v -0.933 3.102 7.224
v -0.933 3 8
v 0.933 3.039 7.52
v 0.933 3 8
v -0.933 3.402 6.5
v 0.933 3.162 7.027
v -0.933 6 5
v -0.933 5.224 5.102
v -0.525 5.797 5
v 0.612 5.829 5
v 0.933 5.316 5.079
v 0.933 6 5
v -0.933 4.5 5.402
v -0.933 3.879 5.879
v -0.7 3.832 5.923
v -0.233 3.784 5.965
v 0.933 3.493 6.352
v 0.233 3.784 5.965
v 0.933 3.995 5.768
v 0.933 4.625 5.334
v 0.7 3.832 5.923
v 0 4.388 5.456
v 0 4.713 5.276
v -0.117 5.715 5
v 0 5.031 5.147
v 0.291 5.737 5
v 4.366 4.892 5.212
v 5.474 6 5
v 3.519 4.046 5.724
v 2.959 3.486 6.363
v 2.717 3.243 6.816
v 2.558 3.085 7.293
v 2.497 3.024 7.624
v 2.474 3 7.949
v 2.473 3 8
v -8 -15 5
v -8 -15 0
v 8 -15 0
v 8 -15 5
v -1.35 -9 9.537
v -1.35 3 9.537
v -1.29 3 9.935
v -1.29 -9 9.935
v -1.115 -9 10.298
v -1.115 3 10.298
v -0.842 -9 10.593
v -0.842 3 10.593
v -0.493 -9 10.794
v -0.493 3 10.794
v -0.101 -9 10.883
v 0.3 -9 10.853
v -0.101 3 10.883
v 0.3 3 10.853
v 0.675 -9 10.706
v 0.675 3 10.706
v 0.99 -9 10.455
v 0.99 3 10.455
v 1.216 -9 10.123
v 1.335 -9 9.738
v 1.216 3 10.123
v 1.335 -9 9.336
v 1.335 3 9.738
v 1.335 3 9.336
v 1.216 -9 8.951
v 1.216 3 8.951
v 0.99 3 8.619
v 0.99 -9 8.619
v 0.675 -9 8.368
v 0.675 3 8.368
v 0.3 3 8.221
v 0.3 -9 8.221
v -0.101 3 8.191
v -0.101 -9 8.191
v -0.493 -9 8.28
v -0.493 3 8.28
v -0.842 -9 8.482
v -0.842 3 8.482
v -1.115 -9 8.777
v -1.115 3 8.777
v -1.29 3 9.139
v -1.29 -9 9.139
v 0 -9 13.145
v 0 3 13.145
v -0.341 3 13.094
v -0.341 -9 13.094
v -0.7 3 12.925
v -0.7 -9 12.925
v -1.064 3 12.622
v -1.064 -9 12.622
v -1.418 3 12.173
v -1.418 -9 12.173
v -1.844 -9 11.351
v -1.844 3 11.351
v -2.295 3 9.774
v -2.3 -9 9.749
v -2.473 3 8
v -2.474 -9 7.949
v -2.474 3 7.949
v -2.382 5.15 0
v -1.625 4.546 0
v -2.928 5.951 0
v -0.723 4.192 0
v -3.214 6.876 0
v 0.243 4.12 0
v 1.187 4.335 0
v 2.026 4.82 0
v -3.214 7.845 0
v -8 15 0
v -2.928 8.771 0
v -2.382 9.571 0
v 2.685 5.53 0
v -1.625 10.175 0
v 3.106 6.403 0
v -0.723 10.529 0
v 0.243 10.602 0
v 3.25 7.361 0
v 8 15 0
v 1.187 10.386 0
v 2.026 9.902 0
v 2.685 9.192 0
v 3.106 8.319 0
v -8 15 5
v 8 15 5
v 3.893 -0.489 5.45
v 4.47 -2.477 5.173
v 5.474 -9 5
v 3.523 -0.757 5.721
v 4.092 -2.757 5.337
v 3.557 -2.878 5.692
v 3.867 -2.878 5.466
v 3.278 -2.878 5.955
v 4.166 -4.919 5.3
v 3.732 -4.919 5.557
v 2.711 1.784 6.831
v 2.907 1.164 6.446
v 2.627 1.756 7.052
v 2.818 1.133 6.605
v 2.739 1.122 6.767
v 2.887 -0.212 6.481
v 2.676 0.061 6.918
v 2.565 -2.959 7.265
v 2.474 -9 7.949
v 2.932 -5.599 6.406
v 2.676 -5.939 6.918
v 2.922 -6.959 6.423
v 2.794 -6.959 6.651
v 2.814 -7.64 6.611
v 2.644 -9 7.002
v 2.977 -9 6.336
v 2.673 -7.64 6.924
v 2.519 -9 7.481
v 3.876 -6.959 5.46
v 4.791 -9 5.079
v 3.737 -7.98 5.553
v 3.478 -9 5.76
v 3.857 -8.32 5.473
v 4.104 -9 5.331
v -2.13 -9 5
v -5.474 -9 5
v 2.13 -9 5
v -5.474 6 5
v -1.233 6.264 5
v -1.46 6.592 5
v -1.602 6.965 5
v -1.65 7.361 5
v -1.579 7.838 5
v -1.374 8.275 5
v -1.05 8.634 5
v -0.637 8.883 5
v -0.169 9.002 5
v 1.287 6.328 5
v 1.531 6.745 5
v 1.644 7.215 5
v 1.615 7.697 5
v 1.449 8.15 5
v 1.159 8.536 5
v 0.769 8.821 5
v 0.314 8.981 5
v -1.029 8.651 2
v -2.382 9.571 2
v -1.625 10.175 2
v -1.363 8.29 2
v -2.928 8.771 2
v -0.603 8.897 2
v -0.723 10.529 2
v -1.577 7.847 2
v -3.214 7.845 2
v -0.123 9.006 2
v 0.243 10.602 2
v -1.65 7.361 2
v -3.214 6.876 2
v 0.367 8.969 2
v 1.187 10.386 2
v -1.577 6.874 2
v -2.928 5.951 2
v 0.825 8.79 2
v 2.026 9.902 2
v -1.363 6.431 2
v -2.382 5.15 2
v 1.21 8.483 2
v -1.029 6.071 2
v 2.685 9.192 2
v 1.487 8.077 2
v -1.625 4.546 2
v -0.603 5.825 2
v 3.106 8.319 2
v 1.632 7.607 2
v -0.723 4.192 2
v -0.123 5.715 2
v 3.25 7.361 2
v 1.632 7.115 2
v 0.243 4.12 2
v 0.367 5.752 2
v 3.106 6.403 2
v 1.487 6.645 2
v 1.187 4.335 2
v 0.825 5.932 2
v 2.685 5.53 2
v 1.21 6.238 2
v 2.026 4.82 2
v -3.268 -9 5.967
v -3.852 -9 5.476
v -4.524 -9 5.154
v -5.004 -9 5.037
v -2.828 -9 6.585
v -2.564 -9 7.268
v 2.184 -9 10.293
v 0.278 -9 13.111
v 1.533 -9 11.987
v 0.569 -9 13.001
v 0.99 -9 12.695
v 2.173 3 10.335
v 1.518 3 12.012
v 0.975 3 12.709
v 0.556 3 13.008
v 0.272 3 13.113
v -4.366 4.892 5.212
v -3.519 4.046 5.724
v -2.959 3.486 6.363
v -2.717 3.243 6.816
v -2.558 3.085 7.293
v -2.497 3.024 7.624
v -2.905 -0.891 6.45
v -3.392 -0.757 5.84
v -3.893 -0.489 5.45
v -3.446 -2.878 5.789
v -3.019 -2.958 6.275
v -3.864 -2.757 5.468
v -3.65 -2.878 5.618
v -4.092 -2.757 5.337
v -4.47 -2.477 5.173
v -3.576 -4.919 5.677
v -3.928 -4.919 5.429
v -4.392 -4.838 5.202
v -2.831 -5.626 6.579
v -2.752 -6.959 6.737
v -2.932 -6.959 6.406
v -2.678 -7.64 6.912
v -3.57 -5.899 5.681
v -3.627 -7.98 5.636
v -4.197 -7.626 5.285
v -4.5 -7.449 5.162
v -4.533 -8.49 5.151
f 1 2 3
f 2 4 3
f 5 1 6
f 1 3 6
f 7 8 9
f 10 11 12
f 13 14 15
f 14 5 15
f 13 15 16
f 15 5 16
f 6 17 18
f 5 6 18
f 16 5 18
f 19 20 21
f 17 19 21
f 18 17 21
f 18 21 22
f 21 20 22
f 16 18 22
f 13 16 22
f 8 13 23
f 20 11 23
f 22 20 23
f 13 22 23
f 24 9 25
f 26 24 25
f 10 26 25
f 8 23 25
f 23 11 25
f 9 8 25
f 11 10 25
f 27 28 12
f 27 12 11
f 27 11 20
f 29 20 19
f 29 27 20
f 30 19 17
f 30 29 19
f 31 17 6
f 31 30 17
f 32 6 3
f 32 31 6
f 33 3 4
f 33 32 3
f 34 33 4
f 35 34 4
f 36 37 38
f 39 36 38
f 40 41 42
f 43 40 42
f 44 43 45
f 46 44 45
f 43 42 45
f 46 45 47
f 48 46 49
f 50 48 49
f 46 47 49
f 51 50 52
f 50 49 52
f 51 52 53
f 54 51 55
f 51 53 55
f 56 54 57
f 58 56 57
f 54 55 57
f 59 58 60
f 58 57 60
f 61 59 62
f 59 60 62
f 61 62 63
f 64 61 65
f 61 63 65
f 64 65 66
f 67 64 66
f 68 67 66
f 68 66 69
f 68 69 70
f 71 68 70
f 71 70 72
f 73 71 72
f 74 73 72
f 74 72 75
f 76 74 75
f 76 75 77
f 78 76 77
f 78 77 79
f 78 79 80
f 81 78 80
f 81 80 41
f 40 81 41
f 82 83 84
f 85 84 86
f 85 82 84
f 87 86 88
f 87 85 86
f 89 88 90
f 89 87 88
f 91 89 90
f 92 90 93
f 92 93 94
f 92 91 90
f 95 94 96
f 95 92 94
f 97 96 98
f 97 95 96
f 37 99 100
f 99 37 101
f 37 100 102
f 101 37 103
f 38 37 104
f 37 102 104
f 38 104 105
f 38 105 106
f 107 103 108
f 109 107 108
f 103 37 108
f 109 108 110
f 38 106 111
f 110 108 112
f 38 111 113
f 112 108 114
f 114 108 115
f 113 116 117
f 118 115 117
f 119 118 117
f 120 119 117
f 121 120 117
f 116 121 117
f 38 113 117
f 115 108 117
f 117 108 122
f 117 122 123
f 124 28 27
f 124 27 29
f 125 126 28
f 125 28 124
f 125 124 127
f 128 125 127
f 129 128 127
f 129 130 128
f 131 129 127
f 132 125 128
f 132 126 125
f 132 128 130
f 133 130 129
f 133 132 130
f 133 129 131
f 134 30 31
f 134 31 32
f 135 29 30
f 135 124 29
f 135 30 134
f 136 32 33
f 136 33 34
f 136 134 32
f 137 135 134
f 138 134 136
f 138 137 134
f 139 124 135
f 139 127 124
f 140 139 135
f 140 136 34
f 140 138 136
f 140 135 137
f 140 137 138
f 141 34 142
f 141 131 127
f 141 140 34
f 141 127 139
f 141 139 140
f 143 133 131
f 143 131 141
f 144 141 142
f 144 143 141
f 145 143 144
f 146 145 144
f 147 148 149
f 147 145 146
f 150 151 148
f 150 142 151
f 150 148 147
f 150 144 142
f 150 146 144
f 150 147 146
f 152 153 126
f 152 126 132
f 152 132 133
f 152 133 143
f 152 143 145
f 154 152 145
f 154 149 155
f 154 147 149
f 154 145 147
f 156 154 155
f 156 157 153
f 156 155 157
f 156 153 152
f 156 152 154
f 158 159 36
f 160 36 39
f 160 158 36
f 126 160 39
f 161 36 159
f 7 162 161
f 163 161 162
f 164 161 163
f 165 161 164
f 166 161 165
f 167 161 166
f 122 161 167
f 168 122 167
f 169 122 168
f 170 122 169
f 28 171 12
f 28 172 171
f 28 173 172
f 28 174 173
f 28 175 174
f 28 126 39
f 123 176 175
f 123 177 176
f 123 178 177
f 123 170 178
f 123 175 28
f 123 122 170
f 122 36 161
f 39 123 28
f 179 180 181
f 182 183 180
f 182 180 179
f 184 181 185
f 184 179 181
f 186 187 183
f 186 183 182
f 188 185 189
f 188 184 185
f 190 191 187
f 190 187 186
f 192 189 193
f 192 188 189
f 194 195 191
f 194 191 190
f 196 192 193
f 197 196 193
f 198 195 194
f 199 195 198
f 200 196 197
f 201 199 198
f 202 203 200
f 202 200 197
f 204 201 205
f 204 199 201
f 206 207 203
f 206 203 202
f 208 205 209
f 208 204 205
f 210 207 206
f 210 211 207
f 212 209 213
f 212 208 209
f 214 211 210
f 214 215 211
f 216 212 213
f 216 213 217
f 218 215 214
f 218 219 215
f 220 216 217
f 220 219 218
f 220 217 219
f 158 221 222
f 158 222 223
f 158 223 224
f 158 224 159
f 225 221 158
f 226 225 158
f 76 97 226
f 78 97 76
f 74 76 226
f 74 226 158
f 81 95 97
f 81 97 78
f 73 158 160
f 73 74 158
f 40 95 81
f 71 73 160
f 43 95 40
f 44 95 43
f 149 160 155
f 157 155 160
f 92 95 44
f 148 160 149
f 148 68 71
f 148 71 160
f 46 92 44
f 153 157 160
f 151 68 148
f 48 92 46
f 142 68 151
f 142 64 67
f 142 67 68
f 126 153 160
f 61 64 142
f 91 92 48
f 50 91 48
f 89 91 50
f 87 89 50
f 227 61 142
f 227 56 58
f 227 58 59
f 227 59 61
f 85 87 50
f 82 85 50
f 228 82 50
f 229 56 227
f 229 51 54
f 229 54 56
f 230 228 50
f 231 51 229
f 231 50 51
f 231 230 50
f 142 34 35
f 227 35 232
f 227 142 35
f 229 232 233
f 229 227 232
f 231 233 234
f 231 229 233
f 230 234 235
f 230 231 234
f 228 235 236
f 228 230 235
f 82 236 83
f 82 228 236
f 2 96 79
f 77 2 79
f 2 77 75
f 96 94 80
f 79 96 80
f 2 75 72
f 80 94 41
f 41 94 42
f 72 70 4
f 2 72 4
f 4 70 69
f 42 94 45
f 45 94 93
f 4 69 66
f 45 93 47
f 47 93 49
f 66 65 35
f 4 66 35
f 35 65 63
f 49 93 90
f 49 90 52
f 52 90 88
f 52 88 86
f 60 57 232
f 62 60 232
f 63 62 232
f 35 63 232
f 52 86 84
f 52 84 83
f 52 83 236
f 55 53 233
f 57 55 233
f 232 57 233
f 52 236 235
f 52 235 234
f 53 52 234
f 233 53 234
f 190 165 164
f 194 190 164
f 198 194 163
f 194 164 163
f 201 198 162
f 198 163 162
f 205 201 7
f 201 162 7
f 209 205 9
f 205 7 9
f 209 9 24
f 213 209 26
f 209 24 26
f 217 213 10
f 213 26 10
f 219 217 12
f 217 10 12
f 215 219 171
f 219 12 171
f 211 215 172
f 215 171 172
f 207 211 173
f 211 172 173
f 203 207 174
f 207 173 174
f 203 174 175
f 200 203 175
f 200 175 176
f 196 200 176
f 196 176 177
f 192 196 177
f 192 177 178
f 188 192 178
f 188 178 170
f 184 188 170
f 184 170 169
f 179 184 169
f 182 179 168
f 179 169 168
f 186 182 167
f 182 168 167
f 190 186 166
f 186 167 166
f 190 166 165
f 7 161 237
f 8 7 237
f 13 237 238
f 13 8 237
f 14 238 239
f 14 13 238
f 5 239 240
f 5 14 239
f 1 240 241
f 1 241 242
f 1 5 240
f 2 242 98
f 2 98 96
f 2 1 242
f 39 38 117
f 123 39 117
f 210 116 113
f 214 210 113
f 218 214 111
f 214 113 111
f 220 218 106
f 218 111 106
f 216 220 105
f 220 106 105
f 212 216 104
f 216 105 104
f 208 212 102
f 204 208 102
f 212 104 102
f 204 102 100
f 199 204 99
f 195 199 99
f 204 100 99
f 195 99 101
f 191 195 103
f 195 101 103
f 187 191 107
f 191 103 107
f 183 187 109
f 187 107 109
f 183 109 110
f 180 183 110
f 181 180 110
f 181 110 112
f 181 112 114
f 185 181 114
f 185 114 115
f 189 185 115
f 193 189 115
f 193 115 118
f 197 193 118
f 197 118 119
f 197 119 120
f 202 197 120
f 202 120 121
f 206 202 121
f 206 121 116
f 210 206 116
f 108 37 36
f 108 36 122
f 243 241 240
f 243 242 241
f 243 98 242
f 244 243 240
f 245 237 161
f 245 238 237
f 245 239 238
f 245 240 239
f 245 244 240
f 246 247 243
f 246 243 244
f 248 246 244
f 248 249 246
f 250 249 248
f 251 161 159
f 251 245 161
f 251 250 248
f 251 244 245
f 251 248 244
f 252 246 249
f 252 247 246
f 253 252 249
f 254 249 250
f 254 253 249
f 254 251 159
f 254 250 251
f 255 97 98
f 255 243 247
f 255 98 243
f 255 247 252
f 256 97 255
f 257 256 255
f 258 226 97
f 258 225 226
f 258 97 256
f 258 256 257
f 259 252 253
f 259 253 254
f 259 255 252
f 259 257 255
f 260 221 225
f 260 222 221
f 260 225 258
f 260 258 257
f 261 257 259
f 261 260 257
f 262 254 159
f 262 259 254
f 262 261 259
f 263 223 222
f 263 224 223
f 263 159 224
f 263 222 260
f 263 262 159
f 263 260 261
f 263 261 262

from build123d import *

# Parameters (mm, degrees)
F0_W           = 16
F0_H           = 30
F1_DEPTH       = 5
F4_DEPTH       = 12
F6_D           = 2.7
F7_D           = 3.3
F7_CBORE_D     = 6.5
F7_CBORE_DEPTH = 2
F8_R           = 3


with BuildPart() as f1:
    # F0 (on Top) → F1 (new body)
    with BuildSketch(Plane.XY):
        Rectangle(F0_W, F0_H)
    extrude(amount=F1_DEPTH)

    # F3 (on offset) → F4 (join)
    with BuildSketch(Plane.XZ.offset(9)):
        with BuildLine():
            add(Edge.make_bspline(
                [(0, 13.1453461945), (-4.2880371505, 13.1453461945), (-2.1440185752, 5.0531195011), (0, -3.0391071923), (2.1440185752, 5.0531195011), (4.2880371505, 13.1453461945), (0, 13.1453461945)],
                knots=[0, 0, 0, 2.0943951024, 2.0943951024, 4.1887902048, 4.1887902048, 6.2831853072, 6.2831853072, 6.2831853072], degree=2, weights=[1, 0.5, 1, 0.5, 1, 0.5, 1]))
        make_face()
    extrude(amount=-F4_DEPTH)

    # F6 (through all)
    with Locations(Plane.XZ.offset(9)):
        with Locations((0, 9.5370300114)):
            Hole(F6_D / 2)

    # F7 (through all)
    with Locations(Plane(origin=(0, 0, 0), x_dir=(1, 0, 0), z_dir=(0, 0, -1))):
        with Locations((0, -7.3607559316)):
            CounterBoreHole(F7_D / 2, F7_CBORE_D / 2, F7_CBORE_DEPTH)

    # F8
    f8_edges = [f1.edges().sort_by_distance(p)[0] for p in [
        (-2.129759, -3, 5),
        (2.129759, -3, 5),
        (0, 3, 5),
    ]]
    fillet(f8_edges, radius=F8_R)


solid = f1.part
